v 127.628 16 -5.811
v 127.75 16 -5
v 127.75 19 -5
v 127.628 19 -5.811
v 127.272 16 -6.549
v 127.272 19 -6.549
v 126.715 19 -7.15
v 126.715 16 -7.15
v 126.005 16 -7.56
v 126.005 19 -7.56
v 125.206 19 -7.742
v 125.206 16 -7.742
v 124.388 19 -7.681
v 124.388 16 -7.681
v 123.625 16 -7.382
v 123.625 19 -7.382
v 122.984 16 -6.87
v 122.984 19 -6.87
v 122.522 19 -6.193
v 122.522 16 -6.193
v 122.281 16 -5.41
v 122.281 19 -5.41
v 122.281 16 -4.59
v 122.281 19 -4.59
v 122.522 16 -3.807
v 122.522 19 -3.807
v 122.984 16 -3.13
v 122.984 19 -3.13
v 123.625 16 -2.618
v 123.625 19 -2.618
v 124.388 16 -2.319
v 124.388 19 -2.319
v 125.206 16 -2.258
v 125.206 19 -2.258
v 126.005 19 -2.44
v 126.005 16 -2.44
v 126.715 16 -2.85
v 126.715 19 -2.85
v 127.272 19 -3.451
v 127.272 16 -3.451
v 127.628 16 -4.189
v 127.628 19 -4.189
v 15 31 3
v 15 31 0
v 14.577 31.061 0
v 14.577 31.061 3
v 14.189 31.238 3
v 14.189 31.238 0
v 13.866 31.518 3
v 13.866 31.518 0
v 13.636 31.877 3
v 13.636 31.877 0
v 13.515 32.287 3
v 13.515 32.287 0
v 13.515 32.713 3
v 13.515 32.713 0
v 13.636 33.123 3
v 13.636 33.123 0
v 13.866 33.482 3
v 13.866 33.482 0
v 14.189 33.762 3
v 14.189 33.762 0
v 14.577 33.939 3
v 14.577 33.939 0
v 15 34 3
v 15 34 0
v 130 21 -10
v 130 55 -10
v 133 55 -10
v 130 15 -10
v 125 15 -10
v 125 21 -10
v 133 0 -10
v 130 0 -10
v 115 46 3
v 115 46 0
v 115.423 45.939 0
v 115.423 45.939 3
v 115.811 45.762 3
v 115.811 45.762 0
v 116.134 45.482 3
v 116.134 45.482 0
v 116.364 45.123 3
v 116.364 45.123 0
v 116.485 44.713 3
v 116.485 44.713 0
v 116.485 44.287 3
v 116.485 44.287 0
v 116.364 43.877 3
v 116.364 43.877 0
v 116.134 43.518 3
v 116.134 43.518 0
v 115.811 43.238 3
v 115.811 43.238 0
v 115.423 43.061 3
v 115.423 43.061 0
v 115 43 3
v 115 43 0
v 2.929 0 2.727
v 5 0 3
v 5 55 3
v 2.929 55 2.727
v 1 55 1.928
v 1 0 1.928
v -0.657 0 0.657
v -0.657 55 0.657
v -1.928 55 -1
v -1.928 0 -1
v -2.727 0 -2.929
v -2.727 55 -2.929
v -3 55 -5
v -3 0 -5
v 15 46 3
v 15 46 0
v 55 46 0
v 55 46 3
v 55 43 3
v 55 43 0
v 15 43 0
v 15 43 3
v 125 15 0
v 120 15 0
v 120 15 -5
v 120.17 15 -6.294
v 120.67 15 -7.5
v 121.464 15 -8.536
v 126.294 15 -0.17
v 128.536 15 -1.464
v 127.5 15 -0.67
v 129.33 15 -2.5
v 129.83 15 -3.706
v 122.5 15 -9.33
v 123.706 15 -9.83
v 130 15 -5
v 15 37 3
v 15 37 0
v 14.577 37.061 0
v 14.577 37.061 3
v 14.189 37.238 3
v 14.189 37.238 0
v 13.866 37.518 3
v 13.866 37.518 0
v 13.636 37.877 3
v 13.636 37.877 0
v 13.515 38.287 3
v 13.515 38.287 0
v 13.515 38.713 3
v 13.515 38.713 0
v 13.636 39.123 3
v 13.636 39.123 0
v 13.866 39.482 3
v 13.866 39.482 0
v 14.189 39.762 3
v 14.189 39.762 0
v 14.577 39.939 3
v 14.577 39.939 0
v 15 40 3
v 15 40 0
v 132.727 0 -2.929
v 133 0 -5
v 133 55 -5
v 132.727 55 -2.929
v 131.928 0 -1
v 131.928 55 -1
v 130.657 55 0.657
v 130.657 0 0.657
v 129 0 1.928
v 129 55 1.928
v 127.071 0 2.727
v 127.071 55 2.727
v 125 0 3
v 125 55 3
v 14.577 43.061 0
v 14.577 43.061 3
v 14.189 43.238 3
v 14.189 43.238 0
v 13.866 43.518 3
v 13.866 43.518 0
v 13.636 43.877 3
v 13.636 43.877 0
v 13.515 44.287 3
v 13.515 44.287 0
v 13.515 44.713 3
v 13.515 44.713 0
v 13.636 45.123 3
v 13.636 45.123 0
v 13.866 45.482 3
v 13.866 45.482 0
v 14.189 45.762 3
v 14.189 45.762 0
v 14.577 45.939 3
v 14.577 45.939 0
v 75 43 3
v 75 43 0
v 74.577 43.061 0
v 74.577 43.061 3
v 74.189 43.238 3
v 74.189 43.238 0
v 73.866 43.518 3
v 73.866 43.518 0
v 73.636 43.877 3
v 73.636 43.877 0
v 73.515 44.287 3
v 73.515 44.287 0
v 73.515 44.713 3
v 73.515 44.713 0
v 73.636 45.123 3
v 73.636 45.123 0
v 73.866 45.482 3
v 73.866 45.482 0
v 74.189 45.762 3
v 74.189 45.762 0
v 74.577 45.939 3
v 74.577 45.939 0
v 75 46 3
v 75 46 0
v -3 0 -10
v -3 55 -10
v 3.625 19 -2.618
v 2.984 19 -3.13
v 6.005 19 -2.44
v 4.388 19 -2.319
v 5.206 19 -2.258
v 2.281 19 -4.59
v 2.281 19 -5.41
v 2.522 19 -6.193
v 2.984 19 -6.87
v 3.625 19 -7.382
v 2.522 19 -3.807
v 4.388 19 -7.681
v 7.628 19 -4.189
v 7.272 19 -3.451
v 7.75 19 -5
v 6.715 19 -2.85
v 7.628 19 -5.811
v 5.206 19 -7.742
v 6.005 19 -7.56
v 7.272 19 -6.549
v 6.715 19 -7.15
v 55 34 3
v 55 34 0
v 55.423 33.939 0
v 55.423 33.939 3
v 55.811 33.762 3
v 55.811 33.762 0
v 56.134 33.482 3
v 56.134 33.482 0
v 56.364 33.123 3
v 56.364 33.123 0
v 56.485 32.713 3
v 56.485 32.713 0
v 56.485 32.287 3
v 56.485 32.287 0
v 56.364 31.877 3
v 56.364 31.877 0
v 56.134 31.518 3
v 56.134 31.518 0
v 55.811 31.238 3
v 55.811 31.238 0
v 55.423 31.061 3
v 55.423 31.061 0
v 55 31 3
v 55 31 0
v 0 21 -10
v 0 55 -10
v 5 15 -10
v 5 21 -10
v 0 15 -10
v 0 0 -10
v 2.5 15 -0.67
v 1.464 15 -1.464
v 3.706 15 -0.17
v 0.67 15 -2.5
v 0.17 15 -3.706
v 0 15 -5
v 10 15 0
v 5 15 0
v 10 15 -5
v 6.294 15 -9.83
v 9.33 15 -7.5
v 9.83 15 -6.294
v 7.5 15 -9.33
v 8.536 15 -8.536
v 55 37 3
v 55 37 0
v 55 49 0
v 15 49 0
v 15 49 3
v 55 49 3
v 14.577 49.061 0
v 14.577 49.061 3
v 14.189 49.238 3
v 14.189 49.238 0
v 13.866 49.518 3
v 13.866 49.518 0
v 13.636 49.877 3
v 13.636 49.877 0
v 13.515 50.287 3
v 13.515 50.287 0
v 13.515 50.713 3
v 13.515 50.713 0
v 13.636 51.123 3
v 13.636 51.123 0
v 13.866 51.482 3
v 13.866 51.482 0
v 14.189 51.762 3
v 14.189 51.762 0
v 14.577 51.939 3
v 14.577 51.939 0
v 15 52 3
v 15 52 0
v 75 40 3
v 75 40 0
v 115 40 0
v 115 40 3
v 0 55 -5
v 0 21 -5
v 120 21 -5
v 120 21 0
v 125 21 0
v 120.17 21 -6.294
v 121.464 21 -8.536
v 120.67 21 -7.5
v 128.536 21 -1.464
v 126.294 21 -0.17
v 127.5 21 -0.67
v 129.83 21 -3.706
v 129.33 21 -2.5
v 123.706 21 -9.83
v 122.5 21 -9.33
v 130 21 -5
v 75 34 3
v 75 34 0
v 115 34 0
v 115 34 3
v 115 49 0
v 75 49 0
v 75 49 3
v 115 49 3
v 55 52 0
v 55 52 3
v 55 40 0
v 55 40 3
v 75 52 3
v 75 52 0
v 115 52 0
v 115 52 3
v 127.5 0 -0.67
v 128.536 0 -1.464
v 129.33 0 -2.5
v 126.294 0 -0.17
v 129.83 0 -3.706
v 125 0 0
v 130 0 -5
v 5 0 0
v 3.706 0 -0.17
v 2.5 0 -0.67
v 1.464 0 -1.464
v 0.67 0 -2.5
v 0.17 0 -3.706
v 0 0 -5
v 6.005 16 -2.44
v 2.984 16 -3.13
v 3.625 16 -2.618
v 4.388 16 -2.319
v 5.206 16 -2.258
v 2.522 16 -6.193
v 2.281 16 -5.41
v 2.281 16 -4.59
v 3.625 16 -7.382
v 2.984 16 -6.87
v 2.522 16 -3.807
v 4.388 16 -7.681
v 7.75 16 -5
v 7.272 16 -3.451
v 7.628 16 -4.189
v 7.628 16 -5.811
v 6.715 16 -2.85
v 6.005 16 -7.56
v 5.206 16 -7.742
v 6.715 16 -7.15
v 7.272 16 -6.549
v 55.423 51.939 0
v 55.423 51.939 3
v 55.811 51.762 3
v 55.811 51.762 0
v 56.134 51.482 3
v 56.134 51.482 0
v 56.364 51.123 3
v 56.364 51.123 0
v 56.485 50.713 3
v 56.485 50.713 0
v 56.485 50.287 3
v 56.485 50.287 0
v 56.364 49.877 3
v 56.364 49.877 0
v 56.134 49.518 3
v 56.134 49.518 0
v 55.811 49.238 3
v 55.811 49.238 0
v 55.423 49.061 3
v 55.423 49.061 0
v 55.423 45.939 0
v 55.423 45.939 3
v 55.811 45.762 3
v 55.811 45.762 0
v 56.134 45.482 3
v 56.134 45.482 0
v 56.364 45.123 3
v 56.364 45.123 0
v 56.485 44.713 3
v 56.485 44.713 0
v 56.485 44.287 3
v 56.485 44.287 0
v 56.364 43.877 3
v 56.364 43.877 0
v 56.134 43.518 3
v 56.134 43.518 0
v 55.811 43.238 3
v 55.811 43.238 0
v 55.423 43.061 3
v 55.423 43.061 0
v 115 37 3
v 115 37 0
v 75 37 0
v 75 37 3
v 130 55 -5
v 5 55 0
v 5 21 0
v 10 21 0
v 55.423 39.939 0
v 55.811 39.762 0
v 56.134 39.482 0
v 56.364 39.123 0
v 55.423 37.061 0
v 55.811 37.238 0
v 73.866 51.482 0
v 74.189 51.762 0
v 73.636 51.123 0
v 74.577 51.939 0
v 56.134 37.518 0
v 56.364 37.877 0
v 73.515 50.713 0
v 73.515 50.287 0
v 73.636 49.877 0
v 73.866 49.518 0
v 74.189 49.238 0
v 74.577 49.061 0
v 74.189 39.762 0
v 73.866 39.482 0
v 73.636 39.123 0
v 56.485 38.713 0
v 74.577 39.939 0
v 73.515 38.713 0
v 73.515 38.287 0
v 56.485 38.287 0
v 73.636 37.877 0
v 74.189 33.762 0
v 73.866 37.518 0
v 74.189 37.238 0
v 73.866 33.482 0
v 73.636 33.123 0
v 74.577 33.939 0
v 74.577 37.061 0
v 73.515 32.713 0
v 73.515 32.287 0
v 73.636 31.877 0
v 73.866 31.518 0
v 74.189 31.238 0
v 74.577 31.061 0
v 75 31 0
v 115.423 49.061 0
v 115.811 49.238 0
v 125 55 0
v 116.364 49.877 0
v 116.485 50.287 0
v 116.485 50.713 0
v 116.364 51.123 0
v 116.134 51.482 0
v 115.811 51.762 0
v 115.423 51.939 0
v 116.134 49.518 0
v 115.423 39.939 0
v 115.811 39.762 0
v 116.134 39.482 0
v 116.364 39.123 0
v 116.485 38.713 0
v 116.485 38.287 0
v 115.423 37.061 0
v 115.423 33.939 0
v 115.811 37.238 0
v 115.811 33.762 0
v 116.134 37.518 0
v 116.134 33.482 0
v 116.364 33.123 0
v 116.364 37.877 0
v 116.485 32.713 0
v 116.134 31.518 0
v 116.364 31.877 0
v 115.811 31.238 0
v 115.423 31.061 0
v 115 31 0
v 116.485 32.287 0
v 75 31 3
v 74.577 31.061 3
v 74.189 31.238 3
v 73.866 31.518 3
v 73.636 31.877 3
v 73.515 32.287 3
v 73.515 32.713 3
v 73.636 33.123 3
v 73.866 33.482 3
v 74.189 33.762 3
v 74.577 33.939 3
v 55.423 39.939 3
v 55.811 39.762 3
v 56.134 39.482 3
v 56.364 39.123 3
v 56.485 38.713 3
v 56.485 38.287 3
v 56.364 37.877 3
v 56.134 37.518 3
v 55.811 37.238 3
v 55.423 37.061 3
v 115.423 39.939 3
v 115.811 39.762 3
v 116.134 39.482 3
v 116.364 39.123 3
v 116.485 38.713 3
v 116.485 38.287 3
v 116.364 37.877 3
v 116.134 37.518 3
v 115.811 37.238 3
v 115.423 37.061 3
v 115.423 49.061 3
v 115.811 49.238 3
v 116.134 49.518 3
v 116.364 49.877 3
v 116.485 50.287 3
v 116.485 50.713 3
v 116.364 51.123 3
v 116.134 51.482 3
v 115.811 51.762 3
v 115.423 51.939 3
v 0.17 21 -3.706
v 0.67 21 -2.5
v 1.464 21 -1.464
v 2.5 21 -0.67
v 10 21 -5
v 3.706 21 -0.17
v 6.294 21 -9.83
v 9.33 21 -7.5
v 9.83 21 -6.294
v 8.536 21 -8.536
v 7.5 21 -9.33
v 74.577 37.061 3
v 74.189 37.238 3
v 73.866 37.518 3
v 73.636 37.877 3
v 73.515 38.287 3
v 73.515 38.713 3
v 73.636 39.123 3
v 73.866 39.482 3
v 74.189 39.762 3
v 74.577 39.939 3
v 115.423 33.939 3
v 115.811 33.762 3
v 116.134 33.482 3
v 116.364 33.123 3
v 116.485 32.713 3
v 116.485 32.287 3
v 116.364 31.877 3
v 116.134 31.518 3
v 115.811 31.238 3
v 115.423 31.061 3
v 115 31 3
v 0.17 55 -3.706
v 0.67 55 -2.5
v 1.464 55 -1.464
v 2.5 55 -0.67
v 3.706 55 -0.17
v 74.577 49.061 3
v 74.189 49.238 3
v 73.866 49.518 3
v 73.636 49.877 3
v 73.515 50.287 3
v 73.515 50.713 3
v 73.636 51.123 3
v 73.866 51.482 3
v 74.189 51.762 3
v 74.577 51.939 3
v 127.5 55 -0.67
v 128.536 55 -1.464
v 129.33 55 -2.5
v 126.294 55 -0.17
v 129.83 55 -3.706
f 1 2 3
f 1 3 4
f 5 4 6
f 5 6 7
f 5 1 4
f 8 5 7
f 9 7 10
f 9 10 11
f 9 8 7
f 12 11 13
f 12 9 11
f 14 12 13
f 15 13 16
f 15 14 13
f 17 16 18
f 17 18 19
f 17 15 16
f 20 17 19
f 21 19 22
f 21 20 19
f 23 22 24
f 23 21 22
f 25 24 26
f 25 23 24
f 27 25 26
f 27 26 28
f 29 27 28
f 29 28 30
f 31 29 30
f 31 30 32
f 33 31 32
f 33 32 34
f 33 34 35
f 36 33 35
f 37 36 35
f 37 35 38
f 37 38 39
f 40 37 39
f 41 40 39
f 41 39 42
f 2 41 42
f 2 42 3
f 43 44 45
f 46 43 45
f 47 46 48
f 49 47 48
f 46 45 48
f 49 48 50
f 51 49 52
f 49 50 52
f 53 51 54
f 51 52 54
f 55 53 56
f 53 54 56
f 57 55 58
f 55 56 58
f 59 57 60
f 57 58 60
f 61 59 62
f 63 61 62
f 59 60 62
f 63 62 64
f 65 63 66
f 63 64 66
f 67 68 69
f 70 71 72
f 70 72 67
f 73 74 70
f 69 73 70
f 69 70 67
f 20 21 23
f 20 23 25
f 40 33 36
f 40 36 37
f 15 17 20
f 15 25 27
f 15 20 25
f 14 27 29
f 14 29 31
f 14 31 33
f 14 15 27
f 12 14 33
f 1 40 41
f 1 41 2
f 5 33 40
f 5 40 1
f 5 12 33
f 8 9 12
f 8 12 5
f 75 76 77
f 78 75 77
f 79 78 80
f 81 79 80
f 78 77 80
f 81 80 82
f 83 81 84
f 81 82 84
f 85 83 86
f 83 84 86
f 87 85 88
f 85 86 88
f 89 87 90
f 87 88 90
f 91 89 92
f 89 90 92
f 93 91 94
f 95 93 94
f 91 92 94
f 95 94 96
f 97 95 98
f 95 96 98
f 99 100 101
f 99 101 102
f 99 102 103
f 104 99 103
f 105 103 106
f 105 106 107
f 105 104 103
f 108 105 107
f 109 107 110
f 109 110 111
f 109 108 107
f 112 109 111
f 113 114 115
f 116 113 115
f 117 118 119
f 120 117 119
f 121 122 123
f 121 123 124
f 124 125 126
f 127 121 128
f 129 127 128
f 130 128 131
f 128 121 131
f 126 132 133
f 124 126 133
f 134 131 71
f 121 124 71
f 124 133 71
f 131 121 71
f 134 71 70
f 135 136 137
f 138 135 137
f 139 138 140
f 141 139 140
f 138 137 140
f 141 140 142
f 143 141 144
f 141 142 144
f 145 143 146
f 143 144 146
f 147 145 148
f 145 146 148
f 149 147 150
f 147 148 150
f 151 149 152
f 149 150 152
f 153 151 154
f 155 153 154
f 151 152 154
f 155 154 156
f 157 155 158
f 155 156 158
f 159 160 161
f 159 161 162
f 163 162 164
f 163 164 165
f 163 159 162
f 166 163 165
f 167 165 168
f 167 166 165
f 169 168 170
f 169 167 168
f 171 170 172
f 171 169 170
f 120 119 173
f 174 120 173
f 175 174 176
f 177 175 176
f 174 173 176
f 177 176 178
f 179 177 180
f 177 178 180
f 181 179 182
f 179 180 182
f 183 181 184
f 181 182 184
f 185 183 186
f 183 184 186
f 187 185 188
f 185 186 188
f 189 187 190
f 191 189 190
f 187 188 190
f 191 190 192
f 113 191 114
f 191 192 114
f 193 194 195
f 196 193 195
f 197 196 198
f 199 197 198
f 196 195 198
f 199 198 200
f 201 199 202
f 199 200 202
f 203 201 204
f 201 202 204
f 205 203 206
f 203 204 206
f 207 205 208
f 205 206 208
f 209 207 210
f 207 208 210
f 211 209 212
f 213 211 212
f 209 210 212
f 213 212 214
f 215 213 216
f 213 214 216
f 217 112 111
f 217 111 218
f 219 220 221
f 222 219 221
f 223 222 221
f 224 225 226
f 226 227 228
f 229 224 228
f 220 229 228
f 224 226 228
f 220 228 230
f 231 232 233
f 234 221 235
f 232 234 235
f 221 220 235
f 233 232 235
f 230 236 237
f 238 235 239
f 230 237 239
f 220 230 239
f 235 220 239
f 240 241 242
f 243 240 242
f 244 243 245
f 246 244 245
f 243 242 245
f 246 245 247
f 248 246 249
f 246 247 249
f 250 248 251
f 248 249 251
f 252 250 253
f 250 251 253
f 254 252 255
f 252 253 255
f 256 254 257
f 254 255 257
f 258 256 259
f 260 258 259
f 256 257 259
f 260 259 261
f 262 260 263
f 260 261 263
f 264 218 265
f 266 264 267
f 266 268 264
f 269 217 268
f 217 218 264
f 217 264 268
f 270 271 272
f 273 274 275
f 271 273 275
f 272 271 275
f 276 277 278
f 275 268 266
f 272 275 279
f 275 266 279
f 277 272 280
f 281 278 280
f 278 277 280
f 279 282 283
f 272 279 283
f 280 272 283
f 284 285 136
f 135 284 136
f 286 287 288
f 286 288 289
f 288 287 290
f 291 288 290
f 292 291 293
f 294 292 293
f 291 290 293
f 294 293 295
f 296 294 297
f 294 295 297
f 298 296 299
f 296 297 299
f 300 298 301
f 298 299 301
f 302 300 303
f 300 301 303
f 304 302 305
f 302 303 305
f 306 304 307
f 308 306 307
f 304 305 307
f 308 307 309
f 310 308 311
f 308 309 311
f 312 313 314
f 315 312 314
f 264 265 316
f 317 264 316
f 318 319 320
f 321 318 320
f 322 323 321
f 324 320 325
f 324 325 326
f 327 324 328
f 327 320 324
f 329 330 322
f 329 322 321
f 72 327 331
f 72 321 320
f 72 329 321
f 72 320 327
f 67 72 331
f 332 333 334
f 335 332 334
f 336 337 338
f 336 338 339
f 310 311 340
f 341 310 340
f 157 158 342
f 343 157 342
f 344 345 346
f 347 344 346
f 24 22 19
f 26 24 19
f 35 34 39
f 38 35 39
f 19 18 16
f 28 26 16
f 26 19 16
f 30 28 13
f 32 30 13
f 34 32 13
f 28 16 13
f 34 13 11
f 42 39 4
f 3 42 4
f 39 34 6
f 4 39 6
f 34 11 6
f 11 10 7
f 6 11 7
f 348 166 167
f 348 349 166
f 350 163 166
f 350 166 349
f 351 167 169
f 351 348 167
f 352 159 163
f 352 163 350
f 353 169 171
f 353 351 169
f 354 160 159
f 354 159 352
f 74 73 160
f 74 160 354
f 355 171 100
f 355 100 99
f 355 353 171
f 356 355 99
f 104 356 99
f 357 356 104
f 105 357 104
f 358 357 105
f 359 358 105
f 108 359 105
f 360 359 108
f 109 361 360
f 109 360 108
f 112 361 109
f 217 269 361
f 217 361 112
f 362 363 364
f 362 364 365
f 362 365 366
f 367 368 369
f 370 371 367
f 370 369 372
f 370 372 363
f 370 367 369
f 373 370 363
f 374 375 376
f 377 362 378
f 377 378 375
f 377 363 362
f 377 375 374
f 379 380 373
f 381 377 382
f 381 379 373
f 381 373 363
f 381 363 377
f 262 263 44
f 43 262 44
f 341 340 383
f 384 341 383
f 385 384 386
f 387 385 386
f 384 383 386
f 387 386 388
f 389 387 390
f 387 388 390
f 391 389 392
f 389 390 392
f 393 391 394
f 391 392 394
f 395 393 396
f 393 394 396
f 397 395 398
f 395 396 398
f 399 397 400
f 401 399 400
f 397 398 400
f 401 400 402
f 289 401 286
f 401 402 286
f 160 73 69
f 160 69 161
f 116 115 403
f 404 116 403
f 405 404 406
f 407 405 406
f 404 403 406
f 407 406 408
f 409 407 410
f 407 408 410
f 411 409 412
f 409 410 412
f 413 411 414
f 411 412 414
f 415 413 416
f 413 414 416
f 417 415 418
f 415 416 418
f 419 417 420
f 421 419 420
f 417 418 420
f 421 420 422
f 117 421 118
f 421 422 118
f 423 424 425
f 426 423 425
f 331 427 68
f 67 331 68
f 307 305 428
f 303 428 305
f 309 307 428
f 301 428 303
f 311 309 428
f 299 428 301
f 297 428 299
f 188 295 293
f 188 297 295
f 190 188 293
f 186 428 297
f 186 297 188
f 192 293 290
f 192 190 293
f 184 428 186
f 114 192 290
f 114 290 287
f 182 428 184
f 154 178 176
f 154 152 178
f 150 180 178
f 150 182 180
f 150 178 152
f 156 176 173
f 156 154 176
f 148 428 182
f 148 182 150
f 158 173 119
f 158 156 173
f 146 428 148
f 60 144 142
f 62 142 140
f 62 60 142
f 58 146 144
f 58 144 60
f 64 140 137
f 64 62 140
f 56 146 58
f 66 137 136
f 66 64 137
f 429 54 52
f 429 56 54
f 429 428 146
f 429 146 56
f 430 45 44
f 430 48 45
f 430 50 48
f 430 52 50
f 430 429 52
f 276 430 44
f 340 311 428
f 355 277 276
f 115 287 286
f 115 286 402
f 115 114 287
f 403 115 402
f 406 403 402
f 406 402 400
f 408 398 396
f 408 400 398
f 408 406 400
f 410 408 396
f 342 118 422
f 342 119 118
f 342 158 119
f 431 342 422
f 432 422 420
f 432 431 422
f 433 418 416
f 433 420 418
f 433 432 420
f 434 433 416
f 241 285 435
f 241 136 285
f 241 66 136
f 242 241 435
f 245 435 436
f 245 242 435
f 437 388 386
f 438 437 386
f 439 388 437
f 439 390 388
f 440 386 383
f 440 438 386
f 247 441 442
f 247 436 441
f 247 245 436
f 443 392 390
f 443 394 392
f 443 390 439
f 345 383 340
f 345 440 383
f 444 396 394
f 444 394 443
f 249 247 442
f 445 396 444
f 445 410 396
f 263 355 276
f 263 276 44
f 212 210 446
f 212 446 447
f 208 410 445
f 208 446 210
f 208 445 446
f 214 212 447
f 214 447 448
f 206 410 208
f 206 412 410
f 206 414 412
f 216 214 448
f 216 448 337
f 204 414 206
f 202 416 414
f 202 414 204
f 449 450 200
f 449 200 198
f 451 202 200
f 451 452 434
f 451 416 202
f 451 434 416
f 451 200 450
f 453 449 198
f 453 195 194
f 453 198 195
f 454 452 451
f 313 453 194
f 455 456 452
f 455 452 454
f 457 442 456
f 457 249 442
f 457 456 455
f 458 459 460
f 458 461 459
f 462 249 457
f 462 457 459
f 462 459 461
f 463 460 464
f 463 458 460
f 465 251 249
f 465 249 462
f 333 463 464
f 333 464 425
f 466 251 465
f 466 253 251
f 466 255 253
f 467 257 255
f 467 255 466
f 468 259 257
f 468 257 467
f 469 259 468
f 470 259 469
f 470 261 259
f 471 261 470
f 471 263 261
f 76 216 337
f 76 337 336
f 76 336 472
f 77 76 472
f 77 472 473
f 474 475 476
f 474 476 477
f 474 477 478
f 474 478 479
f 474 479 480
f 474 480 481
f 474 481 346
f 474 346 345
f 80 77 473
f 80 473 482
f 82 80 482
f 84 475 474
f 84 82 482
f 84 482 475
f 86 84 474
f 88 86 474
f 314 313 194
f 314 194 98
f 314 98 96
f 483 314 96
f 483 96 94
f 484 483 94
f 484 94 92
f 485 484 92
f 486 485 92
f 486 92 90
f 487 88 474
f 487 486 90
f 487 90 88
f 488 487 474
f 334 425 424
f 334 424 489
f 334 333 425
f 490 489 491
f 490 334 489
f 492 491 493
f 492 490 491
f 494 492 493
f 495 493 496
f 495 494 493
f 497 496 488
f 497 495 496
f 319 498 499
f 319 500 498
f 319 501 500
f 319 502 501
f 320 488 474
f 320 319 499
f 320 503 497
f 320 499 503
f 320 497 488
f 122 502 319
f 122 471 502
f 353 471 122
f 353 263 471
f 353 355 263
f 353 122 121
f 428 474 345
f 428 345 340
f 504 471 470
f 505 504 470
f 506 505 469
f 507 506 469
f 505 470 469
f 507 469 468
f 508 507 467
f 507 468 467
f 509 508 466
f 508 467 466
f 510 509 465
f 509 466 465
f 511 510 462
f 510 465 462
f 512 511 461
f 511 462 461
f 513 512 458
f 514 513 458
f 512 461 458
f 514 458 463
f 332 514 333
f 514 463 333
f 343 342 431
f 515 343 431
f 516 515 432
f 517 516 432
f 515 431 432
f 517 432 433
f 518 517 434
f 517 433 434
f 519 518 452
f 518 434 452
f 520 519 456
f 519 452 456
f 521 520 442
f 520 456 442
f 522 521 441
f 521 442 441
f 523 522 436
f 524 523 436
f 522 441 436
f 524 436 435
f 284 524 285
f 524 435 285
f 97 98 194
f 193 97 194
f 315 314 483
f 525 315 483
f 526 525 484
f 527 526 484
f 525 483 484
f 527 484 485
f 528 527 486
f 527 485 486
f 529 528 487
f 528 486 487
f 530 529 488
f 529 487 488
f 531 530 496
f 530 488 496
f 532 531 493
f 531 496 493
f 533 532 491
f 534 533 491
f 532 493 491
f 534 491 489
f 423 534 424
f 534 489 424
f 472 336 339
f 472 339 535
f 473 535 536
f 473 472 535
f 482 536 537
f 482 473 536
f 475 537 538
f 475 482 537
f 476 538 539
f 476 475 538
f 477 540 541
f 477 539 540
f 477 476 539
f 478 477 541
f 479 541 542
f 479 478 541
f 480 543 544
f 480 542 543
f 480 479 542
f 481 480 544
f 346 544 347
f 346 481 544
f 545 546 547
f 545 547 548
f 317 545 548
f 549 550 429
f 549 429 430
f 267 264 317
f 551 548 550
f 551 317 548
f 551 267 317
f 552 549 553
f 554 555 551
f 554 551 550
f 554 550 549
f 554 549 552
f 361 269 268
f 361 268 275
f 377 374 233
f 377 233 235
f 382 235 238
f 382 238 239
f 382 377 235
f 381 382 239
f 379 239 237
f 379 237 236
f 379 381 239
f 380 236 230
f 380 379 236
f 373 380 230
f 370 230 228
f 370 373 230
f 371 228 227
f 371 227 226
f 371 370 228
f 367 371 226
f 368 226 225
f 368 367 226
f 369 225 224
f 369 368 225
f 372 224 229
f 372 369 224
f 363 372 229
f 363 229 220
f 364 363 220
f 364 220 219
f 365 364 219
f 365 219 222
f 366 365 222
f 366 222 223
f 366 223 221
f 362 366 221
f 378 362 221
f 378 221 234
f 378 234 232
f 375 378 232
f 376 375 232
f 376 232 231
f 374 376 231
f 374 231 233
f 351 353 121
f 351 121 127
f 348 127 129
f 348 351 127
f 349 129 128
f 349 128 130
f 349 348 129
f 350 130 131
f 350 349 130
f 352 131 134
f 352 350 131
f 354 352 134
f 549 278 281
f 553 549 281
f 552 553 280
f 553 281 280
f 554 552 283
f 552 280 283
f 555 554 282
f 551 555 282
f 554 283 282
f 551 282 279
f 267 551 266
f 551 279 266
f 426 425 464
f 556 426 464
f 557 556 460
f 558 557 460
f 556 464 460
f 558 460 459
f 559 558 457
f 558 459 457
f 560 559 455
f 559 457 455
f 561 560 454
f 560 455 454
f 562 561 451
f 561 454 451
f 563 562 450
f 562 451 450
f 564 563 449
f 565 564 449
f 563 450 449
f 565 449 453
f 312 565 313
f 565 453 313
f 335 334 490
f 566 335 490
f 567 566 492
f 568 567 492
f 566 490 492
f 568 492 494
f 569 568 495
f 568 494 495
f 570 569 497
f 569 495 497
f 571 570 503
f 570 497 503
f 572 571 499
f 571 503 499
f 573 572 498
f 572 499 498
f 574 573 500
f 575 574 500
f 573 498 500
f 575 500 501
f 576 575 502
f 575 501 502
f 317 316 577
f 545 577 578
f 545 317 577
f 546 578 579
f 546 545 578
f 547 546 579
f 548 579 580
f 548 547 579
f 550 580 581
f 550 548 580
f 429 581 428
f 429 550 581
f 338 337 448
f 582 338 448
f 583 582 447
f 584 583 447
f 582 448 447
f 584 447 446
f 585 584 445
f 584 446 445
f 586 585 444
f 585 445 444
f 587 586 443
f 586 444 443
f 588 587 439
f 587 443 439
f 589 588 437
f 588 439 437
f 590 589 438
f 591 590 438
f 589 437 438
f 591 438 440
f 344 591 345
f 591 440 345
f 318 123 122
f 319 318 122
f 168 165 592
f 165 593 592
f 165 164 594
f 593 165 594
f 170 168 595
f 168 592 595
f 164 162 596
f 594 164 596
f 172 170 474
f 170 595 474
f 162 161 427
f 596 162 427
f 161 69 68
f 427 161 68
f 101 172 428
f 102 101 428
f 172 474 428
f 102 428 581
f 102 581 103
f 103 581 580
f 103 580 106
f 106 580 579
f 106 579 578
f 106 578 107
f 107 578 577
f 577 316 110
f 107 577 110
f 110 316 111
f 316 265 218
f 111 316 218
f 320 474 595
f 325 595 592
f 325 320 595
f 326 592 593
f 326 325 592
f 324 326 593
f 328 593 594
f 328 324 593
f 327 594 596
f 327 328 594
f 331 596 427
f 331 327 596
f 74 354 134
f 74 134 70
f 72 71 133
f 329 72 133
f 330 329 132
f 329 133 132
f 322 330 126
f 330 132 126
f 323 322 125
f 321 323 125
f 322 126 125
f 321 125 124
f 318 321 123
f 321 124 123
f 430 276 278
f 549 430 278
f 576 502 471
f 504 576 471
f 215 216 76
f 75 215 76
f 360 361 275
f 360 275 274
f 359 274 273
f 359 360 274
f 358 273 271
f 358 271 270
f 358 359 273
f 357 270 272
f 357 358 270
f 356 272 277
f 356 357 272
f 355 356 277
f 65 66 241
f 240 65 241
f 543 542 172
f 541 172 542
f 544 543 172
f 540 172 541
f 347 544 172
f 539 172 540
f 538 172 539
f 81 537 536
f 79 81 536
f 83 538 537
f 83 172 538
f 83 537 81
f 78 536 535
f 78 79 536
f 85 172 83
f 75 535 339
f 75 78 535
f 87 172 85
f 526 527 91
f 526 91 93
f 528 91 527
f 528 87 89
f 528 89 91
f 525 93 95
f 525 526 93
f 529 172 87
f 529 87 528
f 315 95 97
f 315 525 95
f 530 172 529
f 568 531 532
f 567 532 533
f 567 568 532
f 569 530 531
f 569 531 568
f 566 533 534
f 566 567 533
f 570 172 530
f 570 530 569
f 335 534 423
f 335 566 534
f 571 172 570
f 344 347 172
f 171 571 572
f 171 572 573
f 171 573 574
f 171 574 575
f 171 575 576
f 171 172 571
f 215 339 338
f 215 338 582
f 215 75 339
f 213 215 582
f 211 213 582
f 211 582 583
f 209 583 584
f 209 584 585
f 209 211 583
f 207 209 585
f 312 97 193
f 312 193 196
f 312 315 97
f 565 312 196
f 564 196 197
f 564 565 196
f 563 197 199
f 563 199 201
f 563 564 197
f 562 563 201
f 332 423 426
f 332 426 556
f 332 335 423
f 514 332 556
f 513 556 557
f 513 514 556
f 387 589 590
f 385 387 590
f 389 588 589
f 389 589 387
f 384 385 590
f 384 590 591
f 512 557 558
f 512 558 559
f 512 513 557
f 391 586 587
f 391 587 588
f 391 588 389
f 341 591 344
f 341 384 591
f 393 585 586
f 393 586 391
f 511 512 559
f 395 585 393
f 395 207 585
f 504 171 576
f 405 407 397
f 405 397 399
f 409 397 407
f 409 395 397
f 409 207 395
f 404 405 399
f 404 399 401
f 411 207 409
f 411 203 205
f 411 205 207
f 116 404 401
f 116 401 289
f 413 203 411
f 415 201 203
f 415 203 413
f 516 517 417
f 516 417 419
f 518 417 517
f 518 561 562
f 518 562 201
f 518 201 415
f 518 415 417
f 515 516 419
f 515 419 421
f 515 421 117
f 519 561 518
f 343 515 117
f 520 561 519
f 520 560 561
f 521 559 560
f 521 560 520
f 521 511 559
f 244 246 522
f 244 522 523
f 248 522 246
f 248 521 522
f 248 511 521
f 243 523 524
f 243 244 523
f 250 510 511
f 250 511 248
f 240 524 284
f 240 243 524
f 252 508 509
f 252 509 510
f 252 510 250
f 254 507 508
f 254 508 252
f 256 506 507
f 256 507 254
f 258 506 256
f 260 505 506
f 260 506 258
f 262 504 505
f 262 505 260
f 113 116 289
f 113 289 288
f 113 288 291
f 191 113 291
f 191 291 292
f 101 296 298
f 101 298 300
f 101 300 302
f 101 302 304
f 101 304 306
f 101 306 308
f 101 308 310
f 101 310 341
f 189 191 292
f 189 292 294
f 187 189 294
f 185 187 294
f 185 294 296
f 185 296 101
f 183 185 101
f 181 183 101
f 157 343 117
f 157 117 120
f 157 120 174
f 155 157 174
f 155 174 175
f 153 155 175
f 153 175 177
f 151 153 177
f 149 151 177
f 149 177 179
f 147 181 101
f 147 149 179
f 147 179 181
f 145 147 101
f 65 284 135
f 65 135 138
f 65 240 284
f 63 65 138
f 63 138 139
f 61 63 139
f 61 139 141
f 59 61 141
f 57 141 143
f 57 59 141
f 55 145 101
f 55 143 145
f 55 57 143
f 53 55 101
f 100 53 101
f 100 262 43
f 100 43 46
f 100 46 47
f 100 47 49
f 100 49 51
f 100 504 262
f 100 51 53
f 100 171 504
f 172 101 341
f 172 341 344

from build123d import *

# Parameters (mm, degrees)
BOSS_EXTRUDE1_DEPTH = 55
BOSS_EXTRUDE2_START = 15
SKETCH2_R           = 5
SKETCH2_R_2         = 2.75
BOSS_EXTRUDE2_DEPTH = 6
CUT_EXTRUDE1_START  = 15
SKETCH2_4_R         = 2.75
CUT_EXTRUDE1_DEPTH  = 4
SKETCH3_W           = 40
SKETCH3_H           = 3
CUT_EXTRUDE2_DEPTH  = 10
BOSS_EXTRUDE3_START = 15
SKETCH2_5_R         = 2.75
BOSS_EXTRUDE3_DEPTH = 1


with BuildPart() as part:
    # Sketch1 → Boss-Extrude1 (new body)
    with BuildSketch(Plane(origin=(0, 0, 0), x_dir=(1, 0, 0), z_dir=(0, 1, 0))):
        with BuildLine():
            Line((-3, 5), (-3, 10))
            Line((-3, 10), (0, 10))
            Line((0, 10), (0, 5))
            ThreePointArc((0, 5), (1.464466094, 1.464466094), (5, 0))
            Line((5, 0), (125, 0))
            ThreePointArc((125, 0), (128.535533906, 1.464466094), (130, 5))
            Line((130, 5), (130, 10))
            Line((130, 10), (133, 10))
            Line((133, 10), (133, 5))
            ThreePointArc((133, 5), (130.656854249, -0.656854249), (125, -3))
            Line((125, -3), (5, -3))
            ThreePointArc((5, -3), (-0.656854249, -0.656854249), (-3, 5))
        make_face()
    extrude(amount=BOSS_EXTRUDE1_DEPTH)

    # Sketch2 → Boss-Extrude2 (add)
    with BuildSketch(Plane(origin=(0, 0, 0), x_dir=(1, 0, 0), z_dir=(0, 1, 0)).offset(BOSS_EXTRUDE2_START)):
        with BuildLine():
            Line((5, 10), (0, 10))
            Line((0, 10), (0, 5))
            ThreePointArc((0, 5), (1.464466094, 8.535533906), (5, 10))
        make_face()
        with Locations((5, 5)):
            Circle(SKETCH2_R)
        with Locations((5, 5)):
            Circle(SKETCH2_R_2, mode=Mode.SUBTRACT)
        with BuildLine():
            Line((10, 0), (10, 5))
            ThreePointArc((10, 5), (8.535533906, 1.464466094), (5, 0))
            Line((5, 0), (10, 0))
        make_face()
        with BuildLine():
            Line((120, 5), (120, 0))
            Line((120, 0), (125, 0))
            ThreePointArc((125, 0), (121.464466094, 1.464466094), (120, 5))
        make_face()
        with Locations((125, 5)):
            Circle(SKETCH2_R)
        with Locations((125, 5)):
            Circle(SKETCH2_R_2, mode=Mode.SUBTRACT)
        with Locations((125, 5)):
            Circle(SKETCH2_R_2)
        with BuildLine():
            ThreePointArc((125, 10), (128.535533906, 8.535533906), (130, 5))
            Line((130, 5), (130, 10))
            Line((130, 10), (125, 10))
        make_face()
        with Locations((5, 5)):
            Circle(SKETCH2_R_2)
    extrude(amount=BOSS_EXTRUDE2_DEPTH)

    # Sketch2<4> → Cut-Extrude1 (cut)
    with BuildSketch(Plane(origin=(0, 0, 0), x_dir=(1, 0, 0), z_dir=(0, 1, 0)).offset(CUT_EXTRUDE1_START)):
        with Locations((5, 5)):
            Circle(SKETCH2_4_R)
        with Locations((125, 5)):
            Circle(SKETCH2_4_R)
    extrude(amount=CUT_EXTRUDE1_DEPTH, mode=Mode.SUBTRACT)

    # Sketch3 → Cut-Extrude2 (cut)
    with BuildSketch(Plane.XY):
        with BuildLine():
            ThreePointArc((55, 40), (56.5, 38.5), (55, 37))
            Line((55, 37), (15, 37))
            ThreePointArc((15, 37), (13.5, 38.5), (15, 40))
            Line((15, 40), (55, 40))
        make_face()
        with BuildLine():
            ThreePointArc((55, 46), (56.5, 44.5), (55, 43))
            Line((55, 43), (15, 43))
            ThreePointArc((15, 43), (13.5, 44.5), (15, 46))
            Line((15, 46), (55, 46))
        make_face()
        with BuildLine():
            Line((115, 37), (75, 37))
            ThreePointArc((75, 37), (73.5, 38.5), (75, 40))
            Line((75, 40), (115, 40))
            ThreePointArc((115, 40), (116.5, 38.5), (115, 37))
        make_face()
        with BuildLine():
            Line((115, 43), (75, 43))
            ThreePointArc((75, 43), (73.5, 44.5), (75, 46))
            Line((75, 46), (115, 46))
            ThreePointArc((115, 46), (116.5, 44.5), (115, 43))
        make_face()
        with Locations((95, 50.5)):
            Rectangle(SKETCH3_W, SKETCH3_H)
        with Locations((35, 50.5)):
            Rectangle(SKETCH3_W, SKETCH3_H)
        with BuildLine():
            ThreePointArc((15, 49), (13.5, 50.5), (15, 52))
            Line((15, 52), (15, 49))
        make_face()
        with BuildLine():
            ThreePointArc((55, 52), (56.5, 50.5), (55, 49))
            Line((55, 49), (55, 52))
        make_face()
        with BuildLine():
            Line((75, 52), (75, 49))
            ThreePointArc((75, 49), (73.5, 50.5), (75, 52))
        make_face()
        with BuildLine():
            Line((115, 52), (115, 49))
            ThreePointArc((115, 49), (116.5, 50.5), (115, 52))
        make_face()
        with BuildLine():
            ThreePointArc((55, 34), (56.5, 32.5), (55, 31))
            Line((55, 31), (15, 31))
            ThreePointArc((15, 31), (13.5, 32.5), (15, 34))
            Line((15, 34), (55, 34))
        make_face()
        with BuildLine():
            Line((115, 31), (75, 31))
            ThreePointArc((75, 31), (73.5, 32.5), (75, 34))
            Line((75, 34), (115, 34))
            ThreePointArc((115, 34), (116.5, 32.5), (115, 31))
        make_face()
    extrude(amount=CUT_EXTRUDE2_DEPTH, mode=Mode.SUBTRACT)

    # Sketch2<5> → Boss-Extrude3 (add)
    with BuildSketch(Plane(origin=(0, 0, 0), x_dir=(1, 0, 0), z_dir=(0, 1, 0)).offset(BOSS_EXTRUDE3_START)):
        with Locations((5, 5)):
            Circle(SKETCH2_5_R)
        with Locations((125, 5)):
            Circle(SKETCH2_5_R)
    extrude(amount=BOSS_EXTRUDE3_DEPTH)


solid = part.part
